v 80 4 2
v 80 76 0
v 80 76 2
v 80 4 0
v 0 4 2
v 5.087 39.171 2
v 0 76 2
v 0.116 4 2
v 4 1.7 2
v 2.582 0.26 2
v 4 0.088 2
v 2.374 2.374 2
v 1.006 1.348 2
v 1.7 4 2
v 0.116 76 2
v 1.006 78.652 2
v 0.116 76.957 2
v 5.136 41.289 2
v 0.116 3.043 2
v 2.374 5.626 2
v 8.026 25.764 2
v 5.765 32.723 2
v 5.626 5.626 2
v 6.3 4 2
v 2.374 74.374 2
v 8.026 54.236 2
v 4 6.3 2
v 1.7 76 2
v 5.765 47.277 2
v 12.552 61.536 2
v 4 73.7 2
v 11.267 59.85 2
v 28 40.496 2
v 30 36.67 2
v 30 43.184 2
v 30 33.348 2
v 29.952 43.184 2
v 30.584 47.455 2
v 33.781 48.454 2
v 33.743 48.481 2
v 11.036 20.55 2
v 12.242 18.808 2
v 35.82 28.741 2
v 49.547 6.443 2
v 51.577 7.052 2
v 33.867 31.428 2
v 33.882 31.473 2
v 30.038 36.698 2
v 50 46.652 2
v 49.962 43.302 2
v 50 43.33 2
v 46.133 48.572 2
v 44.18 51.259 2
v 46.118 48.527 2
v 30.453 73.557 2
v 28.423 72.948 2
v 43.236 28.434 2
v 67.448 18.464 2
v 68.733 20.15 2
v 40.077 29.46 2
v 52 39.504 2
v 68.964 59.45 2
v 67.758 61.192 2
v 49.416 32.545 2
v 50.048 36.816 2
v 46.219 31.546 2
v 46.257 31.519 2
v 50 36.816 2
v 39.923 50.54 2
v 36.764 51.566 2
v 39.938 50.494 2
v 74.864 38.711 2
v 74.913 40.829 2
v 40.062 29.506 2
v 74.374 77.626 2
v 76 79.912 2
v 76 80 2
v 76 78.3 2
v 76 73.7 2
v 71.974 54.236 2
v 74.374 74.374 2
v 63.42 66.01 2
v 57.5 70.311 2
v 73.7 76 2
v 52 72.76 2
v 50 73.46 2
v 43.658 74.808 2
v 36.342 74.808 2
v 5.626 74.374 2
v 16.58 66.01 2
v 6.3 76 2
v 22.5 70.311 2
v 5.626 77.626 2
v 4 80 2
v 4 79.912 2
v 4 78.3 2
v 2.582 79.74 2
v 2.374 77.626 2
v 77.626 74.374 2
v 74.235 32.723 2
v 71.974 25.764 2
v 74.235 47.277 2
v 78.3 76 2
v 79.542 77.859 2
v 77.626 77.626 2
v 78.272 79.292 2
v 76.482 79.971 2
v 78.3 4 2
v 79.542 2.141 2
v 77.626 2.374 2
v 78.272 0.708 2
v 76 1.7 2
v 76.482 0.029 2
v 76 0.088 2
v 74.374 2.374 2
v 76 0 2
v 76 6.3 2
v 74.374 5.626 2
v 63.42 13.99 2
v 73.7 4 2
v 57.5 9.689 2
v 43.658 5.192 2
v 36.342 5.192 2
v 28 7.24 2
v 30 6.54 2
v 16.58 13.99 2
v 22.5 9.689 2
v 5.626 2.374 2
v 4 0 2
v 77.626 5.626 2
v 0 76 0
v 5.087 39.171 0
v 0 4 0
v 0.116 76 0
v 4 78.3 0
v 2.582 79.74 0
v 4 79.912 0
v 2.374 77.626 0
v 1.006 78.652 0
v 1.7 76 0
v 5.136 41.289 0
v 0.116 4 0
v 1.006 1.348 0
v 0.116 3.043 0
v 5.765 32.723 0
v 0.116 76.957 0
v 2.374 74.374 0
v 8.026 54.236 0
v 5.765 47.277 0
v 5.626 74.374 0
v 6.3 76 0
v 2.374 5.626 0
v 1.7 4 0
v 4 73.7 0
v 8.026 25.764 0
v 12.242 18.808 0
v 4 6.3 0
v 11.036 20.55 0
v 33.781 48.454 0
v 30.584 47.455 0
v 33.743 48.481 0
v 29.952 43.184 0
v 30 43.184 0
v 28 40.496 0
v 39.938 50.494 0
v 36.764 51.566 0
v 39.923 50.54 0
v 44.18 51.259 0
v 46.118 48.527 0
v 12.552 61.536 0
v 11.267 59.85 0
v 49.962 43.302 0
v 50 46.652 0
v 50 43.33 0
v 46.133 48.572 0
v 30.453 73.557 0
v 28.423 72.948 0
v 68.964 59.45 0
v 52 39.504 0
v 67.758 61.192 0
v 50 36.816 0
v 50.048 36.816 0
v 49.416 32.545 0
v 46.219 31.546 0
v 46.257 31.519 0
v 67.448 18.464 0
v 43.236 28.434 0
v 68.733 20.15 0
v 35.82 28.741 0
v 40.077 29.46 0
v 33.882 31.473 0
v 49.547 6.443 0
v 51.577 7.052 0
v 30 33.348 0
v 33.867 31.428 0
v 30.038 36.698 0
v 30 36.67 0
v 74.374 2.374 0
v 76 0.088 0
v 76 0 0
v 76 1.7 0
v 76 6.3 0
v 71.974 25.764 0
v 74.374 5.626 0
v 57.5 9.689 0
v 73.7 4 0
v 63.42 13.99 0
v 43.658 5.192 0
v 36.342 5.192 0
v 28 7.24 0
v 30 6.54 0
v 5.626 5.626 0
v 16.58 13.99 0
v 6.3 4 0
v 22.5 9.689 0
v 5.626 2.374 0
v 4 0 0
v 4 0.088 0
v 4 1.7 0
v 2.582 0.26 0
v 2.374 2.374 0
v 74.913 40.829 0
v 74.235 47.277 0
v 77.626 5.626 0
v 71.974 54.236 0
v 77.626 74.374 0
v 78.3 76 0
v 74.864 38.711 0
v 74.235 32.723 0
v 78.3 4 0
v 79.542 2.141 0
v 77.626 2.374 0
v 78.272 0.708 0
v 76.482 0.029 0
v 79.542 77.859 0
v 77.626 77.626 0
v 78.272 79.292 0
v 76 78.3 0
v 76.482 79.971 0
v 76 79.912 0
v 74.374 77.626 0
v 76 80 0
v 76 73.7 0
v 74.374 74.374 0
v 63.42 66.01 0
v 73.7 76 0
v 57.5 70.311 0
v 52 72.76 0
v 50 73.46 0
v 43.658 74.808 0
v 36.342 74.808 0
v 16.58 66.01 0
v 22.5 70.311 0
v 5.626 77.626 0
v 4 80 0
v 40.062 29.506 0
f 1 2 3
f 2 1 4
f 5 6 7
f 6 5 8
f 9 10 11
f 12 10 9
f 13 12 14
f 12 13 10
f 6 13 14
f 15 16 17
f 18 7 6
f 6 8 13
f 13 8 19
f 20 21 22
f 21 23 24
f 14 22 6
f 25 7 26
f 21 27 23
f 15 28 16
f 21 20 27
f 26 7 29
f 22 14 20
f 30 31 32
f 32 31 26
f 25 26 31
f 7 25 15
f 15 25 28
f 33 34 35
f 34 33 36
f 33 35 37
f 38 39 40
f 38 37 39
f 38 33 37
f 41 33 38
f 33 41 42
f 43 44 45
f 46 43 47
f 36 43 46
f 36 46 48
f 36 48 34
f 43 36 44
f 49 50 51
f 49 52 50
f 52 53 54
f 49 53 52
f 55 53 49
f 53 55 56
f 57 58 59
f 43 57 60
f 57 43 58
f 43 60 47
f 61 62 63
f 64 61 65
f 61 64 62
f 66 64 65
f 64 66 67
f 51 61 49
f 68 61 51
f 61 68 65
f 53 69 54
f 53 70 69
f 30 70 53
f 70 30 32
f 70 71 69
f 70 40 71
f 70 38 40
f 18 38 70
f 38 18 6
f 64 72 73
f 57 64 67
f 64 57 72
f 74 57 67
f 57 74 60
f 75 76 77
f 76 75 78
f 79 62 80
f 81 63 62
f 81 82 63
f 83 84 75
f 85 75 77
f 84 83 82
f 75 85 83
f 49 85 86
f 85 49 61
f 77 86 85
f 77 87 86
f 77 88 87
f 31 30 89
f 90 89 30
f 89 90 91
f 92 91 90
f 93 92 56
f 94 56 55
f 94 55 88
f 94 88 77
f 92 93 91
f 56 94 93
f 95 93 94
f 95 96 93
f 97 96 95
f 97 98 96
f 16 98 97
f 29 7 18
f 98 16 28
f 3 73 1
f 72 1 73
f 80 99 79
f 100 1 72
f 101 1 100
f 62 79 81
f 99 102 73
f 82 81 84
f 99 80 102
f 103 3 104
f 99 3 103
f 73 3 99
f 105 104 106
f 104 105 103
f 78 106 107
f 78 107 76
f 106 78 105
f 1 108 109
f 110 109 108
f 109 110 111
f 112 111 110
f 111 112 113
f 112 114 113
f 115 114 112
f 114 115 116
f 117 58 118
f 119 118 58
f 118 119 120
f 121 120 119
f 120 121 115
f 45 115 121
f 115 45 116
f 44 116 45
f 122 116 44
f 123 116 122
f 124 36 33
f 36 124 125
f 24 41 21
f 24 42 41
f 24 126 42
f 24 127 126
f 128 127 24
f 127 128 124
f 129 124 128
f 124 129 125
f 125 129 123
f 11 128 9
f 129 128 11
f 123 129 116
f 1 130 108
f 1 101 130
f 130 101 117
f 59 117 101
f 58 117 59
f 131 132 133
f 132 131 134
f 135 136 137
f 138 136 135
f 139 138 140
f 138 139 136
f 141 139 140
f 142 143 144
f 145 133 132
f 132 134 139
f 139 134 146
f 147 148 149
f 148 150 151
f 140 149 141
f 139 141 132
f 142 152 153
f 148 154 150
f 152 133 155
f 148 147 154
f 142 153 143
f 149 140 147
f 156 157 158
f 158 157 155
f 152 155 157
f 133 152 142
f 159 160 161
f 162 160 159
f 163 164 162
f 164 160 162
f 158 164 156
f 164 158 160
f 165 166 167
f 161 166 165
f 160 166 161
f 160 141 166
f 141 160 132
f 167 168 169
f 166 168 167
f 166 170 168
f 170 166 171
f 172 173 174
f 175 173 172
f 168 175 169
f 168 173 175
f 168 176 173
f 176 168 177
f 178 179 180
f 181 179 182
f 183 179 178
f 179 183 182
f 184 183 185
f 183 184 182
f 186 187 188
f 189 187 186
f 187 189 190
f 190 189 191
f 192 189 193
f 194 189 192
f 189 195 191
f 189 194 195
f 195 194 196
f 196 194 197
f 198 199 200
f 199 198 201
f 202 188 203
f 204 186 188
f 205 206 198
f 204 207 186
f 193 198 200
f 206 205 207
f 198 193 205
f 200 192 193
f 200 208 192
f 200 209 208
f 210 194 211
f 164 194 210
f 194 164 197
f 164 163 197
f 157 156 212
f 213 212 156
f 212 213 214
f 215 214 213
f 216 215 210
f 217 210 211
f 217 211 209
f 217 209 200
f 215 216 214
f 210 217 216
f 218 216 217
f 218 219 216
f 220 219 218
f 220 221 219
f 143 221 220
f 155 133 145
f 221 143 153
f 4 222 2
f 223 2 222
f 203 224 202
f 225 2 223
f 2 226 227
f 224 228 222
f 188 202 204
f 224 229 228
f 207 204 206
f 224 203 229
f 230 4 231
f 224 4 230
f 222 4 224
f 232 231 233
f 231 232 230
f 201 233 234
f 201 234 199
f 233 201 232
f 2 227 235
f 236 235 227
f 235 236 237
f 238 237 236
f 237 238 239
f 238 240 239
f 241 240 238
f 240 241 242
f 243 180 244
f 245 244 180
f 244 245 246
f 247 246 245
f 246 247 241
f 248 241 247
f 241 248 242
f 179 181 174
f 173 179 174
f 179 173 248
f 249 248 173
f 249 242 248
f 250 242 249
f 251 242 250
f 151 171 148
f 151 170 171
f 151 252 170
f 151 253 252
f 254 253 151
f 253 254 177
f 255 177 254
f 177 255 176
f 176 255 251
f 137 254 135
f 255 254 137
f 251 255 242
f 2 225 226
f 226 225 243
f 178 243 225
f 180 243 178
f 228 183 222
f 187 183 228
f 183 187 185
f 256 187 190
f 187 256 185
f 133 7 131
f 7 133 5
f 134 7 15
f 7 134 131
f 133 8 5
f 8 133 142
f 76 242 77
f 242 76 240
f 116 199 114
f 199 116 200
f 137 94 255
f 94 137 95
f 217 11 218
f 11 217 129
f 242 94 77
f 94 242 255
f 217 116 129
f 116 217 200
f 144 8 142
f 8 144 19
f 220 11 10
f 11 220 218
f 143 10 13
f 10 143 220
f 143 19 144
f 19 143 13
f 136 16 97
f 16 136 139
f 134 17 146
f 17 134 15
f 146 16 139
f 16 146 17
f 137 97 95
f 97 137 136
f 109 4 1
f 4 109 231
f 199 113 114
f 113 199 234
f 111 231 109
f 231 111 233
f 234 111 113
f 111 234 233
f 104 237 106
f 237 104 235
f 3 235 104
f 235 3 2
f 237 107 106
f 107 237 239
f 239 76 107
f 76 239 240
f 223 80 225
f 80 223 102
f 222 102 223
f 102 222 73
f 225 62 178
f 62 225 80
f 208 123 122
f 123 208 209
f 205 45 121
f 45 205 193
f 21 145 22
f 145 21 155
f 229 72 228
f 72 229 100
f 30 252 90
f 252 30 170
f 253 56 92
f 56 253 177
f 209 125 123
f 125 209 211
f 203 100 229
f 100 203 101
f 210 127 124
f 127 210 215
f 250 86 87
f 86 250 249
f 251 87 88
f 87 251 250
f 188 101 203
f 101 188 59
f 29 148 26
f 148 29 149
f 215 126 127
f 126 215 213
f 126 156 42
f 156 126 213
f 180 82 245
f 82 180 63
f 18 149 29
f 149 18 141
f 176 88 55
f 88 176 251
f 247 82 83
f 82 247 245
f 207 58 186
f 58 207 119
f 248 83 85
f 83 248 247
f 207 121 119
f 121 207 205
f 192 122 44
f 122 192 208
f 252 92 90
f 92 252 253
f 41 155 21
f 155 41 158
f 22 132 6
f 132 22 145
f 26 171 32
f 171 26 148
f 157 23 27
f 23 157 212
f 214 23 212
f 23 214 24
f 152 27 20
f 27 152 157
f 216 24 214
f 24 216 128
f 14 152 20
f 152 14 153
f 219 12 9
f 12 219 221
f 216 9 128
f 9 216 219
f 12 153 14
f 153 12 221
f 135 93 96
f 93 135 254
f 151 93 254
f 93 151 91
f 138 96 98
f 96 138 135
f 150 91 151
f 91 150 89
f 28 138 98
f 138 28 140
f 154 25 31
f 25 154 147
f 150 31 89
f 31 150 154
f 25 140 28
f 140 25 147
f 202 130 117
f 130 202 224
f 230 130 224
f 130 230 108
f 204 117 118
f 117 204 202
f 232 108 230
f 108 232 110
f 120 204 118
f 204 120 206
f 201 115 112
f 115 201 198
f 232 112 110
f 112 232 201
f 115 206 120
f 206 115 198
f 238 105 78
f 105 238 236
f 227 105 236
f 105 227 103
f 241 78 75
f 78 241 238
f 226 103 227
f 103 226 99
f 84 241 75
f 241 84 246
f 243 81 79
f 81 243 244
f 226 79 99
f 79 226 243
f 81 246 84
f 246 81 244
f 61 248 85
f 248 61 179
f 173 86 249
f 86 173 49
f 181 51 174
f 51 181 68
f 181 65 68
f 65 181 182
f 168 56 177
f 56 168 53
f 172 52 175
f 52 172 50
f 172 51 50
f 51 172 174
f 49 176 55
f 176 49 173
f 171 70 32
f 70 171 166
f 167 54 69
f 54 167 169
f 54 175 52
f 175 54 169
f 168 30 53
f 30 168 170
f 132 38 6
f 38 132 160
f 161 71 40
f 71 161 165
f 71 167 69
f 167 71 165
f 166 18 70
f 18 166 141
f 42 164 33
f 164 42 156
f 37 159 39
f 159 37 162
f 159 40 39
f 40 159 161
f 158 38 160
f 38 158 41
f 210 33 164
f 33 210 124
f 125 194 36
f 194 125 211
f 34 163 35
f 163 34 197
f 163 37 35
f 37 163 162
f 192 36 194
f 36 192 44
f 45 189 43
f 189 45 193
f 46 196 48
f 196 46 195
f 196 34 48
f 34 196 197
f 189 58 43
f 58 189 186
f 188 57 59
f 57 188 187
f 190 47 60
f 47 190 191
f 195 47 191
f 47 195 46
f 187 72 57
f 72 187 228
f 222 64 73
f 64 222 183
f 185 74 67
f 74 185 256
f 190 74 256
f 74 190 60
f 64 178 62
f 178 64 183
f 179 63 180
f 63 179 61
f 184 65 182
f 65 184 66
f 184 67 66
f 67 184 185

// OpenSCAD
// [FL_INDEX: keywords="openscad, 3d_parametric, Parametric_Aperture_Fan_Grill, csg_solid" | COT="Parametric OpenSCAD design from 3DCodeverse"]
// Title: Parametric Aperture Fan Grill

/* [Body Parameters] */
// Fan Size
size=80;
// Border Width
borderthickness=5;
// Corner Radius 
cornerradius=4;
// Sheet Thickness 
thickness=2;

/* [Screw Hole Parameters] */
// Screw Radius 
screwradius=2.3;
// Screw Inset From Corder
screwinset=4;

/* [Spine Parameters] */
// Number of Spines
spines=10;
// Spine Thickness
spinesize=2;
// Spine Offset from center
spineoffset=10;
// Spine Extra Rotation
spinerotation=0;

/* [Hidden] */
dxf=false;
// Below are not parameters //

// Calculate helper variables
holeradius=size/2-borderthickness;

// Create the grill
if (dxf)
	projection(cut=false) fan_grill();
else
	fan_grill();

module fan_grill()
{
	union()
	{
		difference()
		{
			body();

			// hole
			translate([size/2,size/2,-thickness/4]) cylinder(r=holeradius,h=thickness*2);

			// screws
			translate([screwinset,screwinset,0]) cylinder(r=screwradius,h=thickness);
			translate([screwinset,size-screwinset,0]) cylinder(r=screwradius,h=thickness);
			translate([size-screwinset,screwinset,0]) cylinder(r=screwradius,h=thickness);
			translate([size-screwinset,size-screwinset,0]) cylinder(r=screwradius,h=thickness);
		}
		translate([size/2,size/2,0])
		interrior();
	}
}

module body()
{
	union()
	{
		translate([0,cornerradius,0]) cube(size=[size,size-(cornerradius*2),thickness]);
		translate([cornerradius,0,0]) cube(size=[size-(cornerradius*2),size,thickness]);
		translate([cornerradius,cornerradius,0]) cylinder(r=cornerradius,h=thickness);
		translate([cornerradius,size-cornerradius,0]) cylinder(r=cornerradius,h=thickness);
		translate([size-cornerradius,cornerradius,0]) cylinder(r=cornerradius,h=thickness);
		translate([size-cornerradius,size-cornerradius,0]) cylinder(r=cornerradius,h=thickness);
	}
}

module interrior()
{
	for(i=[0:spines-1])
	{
		  rotate(a=[0,0,i*(360.0/spines)+spinerotation]) 
		  translate([spineoffset,-spineoffset/3.141,0])
		  cube([spinesize,holeradius+(spineoffset/3.141),spinesize]);
	}
}
